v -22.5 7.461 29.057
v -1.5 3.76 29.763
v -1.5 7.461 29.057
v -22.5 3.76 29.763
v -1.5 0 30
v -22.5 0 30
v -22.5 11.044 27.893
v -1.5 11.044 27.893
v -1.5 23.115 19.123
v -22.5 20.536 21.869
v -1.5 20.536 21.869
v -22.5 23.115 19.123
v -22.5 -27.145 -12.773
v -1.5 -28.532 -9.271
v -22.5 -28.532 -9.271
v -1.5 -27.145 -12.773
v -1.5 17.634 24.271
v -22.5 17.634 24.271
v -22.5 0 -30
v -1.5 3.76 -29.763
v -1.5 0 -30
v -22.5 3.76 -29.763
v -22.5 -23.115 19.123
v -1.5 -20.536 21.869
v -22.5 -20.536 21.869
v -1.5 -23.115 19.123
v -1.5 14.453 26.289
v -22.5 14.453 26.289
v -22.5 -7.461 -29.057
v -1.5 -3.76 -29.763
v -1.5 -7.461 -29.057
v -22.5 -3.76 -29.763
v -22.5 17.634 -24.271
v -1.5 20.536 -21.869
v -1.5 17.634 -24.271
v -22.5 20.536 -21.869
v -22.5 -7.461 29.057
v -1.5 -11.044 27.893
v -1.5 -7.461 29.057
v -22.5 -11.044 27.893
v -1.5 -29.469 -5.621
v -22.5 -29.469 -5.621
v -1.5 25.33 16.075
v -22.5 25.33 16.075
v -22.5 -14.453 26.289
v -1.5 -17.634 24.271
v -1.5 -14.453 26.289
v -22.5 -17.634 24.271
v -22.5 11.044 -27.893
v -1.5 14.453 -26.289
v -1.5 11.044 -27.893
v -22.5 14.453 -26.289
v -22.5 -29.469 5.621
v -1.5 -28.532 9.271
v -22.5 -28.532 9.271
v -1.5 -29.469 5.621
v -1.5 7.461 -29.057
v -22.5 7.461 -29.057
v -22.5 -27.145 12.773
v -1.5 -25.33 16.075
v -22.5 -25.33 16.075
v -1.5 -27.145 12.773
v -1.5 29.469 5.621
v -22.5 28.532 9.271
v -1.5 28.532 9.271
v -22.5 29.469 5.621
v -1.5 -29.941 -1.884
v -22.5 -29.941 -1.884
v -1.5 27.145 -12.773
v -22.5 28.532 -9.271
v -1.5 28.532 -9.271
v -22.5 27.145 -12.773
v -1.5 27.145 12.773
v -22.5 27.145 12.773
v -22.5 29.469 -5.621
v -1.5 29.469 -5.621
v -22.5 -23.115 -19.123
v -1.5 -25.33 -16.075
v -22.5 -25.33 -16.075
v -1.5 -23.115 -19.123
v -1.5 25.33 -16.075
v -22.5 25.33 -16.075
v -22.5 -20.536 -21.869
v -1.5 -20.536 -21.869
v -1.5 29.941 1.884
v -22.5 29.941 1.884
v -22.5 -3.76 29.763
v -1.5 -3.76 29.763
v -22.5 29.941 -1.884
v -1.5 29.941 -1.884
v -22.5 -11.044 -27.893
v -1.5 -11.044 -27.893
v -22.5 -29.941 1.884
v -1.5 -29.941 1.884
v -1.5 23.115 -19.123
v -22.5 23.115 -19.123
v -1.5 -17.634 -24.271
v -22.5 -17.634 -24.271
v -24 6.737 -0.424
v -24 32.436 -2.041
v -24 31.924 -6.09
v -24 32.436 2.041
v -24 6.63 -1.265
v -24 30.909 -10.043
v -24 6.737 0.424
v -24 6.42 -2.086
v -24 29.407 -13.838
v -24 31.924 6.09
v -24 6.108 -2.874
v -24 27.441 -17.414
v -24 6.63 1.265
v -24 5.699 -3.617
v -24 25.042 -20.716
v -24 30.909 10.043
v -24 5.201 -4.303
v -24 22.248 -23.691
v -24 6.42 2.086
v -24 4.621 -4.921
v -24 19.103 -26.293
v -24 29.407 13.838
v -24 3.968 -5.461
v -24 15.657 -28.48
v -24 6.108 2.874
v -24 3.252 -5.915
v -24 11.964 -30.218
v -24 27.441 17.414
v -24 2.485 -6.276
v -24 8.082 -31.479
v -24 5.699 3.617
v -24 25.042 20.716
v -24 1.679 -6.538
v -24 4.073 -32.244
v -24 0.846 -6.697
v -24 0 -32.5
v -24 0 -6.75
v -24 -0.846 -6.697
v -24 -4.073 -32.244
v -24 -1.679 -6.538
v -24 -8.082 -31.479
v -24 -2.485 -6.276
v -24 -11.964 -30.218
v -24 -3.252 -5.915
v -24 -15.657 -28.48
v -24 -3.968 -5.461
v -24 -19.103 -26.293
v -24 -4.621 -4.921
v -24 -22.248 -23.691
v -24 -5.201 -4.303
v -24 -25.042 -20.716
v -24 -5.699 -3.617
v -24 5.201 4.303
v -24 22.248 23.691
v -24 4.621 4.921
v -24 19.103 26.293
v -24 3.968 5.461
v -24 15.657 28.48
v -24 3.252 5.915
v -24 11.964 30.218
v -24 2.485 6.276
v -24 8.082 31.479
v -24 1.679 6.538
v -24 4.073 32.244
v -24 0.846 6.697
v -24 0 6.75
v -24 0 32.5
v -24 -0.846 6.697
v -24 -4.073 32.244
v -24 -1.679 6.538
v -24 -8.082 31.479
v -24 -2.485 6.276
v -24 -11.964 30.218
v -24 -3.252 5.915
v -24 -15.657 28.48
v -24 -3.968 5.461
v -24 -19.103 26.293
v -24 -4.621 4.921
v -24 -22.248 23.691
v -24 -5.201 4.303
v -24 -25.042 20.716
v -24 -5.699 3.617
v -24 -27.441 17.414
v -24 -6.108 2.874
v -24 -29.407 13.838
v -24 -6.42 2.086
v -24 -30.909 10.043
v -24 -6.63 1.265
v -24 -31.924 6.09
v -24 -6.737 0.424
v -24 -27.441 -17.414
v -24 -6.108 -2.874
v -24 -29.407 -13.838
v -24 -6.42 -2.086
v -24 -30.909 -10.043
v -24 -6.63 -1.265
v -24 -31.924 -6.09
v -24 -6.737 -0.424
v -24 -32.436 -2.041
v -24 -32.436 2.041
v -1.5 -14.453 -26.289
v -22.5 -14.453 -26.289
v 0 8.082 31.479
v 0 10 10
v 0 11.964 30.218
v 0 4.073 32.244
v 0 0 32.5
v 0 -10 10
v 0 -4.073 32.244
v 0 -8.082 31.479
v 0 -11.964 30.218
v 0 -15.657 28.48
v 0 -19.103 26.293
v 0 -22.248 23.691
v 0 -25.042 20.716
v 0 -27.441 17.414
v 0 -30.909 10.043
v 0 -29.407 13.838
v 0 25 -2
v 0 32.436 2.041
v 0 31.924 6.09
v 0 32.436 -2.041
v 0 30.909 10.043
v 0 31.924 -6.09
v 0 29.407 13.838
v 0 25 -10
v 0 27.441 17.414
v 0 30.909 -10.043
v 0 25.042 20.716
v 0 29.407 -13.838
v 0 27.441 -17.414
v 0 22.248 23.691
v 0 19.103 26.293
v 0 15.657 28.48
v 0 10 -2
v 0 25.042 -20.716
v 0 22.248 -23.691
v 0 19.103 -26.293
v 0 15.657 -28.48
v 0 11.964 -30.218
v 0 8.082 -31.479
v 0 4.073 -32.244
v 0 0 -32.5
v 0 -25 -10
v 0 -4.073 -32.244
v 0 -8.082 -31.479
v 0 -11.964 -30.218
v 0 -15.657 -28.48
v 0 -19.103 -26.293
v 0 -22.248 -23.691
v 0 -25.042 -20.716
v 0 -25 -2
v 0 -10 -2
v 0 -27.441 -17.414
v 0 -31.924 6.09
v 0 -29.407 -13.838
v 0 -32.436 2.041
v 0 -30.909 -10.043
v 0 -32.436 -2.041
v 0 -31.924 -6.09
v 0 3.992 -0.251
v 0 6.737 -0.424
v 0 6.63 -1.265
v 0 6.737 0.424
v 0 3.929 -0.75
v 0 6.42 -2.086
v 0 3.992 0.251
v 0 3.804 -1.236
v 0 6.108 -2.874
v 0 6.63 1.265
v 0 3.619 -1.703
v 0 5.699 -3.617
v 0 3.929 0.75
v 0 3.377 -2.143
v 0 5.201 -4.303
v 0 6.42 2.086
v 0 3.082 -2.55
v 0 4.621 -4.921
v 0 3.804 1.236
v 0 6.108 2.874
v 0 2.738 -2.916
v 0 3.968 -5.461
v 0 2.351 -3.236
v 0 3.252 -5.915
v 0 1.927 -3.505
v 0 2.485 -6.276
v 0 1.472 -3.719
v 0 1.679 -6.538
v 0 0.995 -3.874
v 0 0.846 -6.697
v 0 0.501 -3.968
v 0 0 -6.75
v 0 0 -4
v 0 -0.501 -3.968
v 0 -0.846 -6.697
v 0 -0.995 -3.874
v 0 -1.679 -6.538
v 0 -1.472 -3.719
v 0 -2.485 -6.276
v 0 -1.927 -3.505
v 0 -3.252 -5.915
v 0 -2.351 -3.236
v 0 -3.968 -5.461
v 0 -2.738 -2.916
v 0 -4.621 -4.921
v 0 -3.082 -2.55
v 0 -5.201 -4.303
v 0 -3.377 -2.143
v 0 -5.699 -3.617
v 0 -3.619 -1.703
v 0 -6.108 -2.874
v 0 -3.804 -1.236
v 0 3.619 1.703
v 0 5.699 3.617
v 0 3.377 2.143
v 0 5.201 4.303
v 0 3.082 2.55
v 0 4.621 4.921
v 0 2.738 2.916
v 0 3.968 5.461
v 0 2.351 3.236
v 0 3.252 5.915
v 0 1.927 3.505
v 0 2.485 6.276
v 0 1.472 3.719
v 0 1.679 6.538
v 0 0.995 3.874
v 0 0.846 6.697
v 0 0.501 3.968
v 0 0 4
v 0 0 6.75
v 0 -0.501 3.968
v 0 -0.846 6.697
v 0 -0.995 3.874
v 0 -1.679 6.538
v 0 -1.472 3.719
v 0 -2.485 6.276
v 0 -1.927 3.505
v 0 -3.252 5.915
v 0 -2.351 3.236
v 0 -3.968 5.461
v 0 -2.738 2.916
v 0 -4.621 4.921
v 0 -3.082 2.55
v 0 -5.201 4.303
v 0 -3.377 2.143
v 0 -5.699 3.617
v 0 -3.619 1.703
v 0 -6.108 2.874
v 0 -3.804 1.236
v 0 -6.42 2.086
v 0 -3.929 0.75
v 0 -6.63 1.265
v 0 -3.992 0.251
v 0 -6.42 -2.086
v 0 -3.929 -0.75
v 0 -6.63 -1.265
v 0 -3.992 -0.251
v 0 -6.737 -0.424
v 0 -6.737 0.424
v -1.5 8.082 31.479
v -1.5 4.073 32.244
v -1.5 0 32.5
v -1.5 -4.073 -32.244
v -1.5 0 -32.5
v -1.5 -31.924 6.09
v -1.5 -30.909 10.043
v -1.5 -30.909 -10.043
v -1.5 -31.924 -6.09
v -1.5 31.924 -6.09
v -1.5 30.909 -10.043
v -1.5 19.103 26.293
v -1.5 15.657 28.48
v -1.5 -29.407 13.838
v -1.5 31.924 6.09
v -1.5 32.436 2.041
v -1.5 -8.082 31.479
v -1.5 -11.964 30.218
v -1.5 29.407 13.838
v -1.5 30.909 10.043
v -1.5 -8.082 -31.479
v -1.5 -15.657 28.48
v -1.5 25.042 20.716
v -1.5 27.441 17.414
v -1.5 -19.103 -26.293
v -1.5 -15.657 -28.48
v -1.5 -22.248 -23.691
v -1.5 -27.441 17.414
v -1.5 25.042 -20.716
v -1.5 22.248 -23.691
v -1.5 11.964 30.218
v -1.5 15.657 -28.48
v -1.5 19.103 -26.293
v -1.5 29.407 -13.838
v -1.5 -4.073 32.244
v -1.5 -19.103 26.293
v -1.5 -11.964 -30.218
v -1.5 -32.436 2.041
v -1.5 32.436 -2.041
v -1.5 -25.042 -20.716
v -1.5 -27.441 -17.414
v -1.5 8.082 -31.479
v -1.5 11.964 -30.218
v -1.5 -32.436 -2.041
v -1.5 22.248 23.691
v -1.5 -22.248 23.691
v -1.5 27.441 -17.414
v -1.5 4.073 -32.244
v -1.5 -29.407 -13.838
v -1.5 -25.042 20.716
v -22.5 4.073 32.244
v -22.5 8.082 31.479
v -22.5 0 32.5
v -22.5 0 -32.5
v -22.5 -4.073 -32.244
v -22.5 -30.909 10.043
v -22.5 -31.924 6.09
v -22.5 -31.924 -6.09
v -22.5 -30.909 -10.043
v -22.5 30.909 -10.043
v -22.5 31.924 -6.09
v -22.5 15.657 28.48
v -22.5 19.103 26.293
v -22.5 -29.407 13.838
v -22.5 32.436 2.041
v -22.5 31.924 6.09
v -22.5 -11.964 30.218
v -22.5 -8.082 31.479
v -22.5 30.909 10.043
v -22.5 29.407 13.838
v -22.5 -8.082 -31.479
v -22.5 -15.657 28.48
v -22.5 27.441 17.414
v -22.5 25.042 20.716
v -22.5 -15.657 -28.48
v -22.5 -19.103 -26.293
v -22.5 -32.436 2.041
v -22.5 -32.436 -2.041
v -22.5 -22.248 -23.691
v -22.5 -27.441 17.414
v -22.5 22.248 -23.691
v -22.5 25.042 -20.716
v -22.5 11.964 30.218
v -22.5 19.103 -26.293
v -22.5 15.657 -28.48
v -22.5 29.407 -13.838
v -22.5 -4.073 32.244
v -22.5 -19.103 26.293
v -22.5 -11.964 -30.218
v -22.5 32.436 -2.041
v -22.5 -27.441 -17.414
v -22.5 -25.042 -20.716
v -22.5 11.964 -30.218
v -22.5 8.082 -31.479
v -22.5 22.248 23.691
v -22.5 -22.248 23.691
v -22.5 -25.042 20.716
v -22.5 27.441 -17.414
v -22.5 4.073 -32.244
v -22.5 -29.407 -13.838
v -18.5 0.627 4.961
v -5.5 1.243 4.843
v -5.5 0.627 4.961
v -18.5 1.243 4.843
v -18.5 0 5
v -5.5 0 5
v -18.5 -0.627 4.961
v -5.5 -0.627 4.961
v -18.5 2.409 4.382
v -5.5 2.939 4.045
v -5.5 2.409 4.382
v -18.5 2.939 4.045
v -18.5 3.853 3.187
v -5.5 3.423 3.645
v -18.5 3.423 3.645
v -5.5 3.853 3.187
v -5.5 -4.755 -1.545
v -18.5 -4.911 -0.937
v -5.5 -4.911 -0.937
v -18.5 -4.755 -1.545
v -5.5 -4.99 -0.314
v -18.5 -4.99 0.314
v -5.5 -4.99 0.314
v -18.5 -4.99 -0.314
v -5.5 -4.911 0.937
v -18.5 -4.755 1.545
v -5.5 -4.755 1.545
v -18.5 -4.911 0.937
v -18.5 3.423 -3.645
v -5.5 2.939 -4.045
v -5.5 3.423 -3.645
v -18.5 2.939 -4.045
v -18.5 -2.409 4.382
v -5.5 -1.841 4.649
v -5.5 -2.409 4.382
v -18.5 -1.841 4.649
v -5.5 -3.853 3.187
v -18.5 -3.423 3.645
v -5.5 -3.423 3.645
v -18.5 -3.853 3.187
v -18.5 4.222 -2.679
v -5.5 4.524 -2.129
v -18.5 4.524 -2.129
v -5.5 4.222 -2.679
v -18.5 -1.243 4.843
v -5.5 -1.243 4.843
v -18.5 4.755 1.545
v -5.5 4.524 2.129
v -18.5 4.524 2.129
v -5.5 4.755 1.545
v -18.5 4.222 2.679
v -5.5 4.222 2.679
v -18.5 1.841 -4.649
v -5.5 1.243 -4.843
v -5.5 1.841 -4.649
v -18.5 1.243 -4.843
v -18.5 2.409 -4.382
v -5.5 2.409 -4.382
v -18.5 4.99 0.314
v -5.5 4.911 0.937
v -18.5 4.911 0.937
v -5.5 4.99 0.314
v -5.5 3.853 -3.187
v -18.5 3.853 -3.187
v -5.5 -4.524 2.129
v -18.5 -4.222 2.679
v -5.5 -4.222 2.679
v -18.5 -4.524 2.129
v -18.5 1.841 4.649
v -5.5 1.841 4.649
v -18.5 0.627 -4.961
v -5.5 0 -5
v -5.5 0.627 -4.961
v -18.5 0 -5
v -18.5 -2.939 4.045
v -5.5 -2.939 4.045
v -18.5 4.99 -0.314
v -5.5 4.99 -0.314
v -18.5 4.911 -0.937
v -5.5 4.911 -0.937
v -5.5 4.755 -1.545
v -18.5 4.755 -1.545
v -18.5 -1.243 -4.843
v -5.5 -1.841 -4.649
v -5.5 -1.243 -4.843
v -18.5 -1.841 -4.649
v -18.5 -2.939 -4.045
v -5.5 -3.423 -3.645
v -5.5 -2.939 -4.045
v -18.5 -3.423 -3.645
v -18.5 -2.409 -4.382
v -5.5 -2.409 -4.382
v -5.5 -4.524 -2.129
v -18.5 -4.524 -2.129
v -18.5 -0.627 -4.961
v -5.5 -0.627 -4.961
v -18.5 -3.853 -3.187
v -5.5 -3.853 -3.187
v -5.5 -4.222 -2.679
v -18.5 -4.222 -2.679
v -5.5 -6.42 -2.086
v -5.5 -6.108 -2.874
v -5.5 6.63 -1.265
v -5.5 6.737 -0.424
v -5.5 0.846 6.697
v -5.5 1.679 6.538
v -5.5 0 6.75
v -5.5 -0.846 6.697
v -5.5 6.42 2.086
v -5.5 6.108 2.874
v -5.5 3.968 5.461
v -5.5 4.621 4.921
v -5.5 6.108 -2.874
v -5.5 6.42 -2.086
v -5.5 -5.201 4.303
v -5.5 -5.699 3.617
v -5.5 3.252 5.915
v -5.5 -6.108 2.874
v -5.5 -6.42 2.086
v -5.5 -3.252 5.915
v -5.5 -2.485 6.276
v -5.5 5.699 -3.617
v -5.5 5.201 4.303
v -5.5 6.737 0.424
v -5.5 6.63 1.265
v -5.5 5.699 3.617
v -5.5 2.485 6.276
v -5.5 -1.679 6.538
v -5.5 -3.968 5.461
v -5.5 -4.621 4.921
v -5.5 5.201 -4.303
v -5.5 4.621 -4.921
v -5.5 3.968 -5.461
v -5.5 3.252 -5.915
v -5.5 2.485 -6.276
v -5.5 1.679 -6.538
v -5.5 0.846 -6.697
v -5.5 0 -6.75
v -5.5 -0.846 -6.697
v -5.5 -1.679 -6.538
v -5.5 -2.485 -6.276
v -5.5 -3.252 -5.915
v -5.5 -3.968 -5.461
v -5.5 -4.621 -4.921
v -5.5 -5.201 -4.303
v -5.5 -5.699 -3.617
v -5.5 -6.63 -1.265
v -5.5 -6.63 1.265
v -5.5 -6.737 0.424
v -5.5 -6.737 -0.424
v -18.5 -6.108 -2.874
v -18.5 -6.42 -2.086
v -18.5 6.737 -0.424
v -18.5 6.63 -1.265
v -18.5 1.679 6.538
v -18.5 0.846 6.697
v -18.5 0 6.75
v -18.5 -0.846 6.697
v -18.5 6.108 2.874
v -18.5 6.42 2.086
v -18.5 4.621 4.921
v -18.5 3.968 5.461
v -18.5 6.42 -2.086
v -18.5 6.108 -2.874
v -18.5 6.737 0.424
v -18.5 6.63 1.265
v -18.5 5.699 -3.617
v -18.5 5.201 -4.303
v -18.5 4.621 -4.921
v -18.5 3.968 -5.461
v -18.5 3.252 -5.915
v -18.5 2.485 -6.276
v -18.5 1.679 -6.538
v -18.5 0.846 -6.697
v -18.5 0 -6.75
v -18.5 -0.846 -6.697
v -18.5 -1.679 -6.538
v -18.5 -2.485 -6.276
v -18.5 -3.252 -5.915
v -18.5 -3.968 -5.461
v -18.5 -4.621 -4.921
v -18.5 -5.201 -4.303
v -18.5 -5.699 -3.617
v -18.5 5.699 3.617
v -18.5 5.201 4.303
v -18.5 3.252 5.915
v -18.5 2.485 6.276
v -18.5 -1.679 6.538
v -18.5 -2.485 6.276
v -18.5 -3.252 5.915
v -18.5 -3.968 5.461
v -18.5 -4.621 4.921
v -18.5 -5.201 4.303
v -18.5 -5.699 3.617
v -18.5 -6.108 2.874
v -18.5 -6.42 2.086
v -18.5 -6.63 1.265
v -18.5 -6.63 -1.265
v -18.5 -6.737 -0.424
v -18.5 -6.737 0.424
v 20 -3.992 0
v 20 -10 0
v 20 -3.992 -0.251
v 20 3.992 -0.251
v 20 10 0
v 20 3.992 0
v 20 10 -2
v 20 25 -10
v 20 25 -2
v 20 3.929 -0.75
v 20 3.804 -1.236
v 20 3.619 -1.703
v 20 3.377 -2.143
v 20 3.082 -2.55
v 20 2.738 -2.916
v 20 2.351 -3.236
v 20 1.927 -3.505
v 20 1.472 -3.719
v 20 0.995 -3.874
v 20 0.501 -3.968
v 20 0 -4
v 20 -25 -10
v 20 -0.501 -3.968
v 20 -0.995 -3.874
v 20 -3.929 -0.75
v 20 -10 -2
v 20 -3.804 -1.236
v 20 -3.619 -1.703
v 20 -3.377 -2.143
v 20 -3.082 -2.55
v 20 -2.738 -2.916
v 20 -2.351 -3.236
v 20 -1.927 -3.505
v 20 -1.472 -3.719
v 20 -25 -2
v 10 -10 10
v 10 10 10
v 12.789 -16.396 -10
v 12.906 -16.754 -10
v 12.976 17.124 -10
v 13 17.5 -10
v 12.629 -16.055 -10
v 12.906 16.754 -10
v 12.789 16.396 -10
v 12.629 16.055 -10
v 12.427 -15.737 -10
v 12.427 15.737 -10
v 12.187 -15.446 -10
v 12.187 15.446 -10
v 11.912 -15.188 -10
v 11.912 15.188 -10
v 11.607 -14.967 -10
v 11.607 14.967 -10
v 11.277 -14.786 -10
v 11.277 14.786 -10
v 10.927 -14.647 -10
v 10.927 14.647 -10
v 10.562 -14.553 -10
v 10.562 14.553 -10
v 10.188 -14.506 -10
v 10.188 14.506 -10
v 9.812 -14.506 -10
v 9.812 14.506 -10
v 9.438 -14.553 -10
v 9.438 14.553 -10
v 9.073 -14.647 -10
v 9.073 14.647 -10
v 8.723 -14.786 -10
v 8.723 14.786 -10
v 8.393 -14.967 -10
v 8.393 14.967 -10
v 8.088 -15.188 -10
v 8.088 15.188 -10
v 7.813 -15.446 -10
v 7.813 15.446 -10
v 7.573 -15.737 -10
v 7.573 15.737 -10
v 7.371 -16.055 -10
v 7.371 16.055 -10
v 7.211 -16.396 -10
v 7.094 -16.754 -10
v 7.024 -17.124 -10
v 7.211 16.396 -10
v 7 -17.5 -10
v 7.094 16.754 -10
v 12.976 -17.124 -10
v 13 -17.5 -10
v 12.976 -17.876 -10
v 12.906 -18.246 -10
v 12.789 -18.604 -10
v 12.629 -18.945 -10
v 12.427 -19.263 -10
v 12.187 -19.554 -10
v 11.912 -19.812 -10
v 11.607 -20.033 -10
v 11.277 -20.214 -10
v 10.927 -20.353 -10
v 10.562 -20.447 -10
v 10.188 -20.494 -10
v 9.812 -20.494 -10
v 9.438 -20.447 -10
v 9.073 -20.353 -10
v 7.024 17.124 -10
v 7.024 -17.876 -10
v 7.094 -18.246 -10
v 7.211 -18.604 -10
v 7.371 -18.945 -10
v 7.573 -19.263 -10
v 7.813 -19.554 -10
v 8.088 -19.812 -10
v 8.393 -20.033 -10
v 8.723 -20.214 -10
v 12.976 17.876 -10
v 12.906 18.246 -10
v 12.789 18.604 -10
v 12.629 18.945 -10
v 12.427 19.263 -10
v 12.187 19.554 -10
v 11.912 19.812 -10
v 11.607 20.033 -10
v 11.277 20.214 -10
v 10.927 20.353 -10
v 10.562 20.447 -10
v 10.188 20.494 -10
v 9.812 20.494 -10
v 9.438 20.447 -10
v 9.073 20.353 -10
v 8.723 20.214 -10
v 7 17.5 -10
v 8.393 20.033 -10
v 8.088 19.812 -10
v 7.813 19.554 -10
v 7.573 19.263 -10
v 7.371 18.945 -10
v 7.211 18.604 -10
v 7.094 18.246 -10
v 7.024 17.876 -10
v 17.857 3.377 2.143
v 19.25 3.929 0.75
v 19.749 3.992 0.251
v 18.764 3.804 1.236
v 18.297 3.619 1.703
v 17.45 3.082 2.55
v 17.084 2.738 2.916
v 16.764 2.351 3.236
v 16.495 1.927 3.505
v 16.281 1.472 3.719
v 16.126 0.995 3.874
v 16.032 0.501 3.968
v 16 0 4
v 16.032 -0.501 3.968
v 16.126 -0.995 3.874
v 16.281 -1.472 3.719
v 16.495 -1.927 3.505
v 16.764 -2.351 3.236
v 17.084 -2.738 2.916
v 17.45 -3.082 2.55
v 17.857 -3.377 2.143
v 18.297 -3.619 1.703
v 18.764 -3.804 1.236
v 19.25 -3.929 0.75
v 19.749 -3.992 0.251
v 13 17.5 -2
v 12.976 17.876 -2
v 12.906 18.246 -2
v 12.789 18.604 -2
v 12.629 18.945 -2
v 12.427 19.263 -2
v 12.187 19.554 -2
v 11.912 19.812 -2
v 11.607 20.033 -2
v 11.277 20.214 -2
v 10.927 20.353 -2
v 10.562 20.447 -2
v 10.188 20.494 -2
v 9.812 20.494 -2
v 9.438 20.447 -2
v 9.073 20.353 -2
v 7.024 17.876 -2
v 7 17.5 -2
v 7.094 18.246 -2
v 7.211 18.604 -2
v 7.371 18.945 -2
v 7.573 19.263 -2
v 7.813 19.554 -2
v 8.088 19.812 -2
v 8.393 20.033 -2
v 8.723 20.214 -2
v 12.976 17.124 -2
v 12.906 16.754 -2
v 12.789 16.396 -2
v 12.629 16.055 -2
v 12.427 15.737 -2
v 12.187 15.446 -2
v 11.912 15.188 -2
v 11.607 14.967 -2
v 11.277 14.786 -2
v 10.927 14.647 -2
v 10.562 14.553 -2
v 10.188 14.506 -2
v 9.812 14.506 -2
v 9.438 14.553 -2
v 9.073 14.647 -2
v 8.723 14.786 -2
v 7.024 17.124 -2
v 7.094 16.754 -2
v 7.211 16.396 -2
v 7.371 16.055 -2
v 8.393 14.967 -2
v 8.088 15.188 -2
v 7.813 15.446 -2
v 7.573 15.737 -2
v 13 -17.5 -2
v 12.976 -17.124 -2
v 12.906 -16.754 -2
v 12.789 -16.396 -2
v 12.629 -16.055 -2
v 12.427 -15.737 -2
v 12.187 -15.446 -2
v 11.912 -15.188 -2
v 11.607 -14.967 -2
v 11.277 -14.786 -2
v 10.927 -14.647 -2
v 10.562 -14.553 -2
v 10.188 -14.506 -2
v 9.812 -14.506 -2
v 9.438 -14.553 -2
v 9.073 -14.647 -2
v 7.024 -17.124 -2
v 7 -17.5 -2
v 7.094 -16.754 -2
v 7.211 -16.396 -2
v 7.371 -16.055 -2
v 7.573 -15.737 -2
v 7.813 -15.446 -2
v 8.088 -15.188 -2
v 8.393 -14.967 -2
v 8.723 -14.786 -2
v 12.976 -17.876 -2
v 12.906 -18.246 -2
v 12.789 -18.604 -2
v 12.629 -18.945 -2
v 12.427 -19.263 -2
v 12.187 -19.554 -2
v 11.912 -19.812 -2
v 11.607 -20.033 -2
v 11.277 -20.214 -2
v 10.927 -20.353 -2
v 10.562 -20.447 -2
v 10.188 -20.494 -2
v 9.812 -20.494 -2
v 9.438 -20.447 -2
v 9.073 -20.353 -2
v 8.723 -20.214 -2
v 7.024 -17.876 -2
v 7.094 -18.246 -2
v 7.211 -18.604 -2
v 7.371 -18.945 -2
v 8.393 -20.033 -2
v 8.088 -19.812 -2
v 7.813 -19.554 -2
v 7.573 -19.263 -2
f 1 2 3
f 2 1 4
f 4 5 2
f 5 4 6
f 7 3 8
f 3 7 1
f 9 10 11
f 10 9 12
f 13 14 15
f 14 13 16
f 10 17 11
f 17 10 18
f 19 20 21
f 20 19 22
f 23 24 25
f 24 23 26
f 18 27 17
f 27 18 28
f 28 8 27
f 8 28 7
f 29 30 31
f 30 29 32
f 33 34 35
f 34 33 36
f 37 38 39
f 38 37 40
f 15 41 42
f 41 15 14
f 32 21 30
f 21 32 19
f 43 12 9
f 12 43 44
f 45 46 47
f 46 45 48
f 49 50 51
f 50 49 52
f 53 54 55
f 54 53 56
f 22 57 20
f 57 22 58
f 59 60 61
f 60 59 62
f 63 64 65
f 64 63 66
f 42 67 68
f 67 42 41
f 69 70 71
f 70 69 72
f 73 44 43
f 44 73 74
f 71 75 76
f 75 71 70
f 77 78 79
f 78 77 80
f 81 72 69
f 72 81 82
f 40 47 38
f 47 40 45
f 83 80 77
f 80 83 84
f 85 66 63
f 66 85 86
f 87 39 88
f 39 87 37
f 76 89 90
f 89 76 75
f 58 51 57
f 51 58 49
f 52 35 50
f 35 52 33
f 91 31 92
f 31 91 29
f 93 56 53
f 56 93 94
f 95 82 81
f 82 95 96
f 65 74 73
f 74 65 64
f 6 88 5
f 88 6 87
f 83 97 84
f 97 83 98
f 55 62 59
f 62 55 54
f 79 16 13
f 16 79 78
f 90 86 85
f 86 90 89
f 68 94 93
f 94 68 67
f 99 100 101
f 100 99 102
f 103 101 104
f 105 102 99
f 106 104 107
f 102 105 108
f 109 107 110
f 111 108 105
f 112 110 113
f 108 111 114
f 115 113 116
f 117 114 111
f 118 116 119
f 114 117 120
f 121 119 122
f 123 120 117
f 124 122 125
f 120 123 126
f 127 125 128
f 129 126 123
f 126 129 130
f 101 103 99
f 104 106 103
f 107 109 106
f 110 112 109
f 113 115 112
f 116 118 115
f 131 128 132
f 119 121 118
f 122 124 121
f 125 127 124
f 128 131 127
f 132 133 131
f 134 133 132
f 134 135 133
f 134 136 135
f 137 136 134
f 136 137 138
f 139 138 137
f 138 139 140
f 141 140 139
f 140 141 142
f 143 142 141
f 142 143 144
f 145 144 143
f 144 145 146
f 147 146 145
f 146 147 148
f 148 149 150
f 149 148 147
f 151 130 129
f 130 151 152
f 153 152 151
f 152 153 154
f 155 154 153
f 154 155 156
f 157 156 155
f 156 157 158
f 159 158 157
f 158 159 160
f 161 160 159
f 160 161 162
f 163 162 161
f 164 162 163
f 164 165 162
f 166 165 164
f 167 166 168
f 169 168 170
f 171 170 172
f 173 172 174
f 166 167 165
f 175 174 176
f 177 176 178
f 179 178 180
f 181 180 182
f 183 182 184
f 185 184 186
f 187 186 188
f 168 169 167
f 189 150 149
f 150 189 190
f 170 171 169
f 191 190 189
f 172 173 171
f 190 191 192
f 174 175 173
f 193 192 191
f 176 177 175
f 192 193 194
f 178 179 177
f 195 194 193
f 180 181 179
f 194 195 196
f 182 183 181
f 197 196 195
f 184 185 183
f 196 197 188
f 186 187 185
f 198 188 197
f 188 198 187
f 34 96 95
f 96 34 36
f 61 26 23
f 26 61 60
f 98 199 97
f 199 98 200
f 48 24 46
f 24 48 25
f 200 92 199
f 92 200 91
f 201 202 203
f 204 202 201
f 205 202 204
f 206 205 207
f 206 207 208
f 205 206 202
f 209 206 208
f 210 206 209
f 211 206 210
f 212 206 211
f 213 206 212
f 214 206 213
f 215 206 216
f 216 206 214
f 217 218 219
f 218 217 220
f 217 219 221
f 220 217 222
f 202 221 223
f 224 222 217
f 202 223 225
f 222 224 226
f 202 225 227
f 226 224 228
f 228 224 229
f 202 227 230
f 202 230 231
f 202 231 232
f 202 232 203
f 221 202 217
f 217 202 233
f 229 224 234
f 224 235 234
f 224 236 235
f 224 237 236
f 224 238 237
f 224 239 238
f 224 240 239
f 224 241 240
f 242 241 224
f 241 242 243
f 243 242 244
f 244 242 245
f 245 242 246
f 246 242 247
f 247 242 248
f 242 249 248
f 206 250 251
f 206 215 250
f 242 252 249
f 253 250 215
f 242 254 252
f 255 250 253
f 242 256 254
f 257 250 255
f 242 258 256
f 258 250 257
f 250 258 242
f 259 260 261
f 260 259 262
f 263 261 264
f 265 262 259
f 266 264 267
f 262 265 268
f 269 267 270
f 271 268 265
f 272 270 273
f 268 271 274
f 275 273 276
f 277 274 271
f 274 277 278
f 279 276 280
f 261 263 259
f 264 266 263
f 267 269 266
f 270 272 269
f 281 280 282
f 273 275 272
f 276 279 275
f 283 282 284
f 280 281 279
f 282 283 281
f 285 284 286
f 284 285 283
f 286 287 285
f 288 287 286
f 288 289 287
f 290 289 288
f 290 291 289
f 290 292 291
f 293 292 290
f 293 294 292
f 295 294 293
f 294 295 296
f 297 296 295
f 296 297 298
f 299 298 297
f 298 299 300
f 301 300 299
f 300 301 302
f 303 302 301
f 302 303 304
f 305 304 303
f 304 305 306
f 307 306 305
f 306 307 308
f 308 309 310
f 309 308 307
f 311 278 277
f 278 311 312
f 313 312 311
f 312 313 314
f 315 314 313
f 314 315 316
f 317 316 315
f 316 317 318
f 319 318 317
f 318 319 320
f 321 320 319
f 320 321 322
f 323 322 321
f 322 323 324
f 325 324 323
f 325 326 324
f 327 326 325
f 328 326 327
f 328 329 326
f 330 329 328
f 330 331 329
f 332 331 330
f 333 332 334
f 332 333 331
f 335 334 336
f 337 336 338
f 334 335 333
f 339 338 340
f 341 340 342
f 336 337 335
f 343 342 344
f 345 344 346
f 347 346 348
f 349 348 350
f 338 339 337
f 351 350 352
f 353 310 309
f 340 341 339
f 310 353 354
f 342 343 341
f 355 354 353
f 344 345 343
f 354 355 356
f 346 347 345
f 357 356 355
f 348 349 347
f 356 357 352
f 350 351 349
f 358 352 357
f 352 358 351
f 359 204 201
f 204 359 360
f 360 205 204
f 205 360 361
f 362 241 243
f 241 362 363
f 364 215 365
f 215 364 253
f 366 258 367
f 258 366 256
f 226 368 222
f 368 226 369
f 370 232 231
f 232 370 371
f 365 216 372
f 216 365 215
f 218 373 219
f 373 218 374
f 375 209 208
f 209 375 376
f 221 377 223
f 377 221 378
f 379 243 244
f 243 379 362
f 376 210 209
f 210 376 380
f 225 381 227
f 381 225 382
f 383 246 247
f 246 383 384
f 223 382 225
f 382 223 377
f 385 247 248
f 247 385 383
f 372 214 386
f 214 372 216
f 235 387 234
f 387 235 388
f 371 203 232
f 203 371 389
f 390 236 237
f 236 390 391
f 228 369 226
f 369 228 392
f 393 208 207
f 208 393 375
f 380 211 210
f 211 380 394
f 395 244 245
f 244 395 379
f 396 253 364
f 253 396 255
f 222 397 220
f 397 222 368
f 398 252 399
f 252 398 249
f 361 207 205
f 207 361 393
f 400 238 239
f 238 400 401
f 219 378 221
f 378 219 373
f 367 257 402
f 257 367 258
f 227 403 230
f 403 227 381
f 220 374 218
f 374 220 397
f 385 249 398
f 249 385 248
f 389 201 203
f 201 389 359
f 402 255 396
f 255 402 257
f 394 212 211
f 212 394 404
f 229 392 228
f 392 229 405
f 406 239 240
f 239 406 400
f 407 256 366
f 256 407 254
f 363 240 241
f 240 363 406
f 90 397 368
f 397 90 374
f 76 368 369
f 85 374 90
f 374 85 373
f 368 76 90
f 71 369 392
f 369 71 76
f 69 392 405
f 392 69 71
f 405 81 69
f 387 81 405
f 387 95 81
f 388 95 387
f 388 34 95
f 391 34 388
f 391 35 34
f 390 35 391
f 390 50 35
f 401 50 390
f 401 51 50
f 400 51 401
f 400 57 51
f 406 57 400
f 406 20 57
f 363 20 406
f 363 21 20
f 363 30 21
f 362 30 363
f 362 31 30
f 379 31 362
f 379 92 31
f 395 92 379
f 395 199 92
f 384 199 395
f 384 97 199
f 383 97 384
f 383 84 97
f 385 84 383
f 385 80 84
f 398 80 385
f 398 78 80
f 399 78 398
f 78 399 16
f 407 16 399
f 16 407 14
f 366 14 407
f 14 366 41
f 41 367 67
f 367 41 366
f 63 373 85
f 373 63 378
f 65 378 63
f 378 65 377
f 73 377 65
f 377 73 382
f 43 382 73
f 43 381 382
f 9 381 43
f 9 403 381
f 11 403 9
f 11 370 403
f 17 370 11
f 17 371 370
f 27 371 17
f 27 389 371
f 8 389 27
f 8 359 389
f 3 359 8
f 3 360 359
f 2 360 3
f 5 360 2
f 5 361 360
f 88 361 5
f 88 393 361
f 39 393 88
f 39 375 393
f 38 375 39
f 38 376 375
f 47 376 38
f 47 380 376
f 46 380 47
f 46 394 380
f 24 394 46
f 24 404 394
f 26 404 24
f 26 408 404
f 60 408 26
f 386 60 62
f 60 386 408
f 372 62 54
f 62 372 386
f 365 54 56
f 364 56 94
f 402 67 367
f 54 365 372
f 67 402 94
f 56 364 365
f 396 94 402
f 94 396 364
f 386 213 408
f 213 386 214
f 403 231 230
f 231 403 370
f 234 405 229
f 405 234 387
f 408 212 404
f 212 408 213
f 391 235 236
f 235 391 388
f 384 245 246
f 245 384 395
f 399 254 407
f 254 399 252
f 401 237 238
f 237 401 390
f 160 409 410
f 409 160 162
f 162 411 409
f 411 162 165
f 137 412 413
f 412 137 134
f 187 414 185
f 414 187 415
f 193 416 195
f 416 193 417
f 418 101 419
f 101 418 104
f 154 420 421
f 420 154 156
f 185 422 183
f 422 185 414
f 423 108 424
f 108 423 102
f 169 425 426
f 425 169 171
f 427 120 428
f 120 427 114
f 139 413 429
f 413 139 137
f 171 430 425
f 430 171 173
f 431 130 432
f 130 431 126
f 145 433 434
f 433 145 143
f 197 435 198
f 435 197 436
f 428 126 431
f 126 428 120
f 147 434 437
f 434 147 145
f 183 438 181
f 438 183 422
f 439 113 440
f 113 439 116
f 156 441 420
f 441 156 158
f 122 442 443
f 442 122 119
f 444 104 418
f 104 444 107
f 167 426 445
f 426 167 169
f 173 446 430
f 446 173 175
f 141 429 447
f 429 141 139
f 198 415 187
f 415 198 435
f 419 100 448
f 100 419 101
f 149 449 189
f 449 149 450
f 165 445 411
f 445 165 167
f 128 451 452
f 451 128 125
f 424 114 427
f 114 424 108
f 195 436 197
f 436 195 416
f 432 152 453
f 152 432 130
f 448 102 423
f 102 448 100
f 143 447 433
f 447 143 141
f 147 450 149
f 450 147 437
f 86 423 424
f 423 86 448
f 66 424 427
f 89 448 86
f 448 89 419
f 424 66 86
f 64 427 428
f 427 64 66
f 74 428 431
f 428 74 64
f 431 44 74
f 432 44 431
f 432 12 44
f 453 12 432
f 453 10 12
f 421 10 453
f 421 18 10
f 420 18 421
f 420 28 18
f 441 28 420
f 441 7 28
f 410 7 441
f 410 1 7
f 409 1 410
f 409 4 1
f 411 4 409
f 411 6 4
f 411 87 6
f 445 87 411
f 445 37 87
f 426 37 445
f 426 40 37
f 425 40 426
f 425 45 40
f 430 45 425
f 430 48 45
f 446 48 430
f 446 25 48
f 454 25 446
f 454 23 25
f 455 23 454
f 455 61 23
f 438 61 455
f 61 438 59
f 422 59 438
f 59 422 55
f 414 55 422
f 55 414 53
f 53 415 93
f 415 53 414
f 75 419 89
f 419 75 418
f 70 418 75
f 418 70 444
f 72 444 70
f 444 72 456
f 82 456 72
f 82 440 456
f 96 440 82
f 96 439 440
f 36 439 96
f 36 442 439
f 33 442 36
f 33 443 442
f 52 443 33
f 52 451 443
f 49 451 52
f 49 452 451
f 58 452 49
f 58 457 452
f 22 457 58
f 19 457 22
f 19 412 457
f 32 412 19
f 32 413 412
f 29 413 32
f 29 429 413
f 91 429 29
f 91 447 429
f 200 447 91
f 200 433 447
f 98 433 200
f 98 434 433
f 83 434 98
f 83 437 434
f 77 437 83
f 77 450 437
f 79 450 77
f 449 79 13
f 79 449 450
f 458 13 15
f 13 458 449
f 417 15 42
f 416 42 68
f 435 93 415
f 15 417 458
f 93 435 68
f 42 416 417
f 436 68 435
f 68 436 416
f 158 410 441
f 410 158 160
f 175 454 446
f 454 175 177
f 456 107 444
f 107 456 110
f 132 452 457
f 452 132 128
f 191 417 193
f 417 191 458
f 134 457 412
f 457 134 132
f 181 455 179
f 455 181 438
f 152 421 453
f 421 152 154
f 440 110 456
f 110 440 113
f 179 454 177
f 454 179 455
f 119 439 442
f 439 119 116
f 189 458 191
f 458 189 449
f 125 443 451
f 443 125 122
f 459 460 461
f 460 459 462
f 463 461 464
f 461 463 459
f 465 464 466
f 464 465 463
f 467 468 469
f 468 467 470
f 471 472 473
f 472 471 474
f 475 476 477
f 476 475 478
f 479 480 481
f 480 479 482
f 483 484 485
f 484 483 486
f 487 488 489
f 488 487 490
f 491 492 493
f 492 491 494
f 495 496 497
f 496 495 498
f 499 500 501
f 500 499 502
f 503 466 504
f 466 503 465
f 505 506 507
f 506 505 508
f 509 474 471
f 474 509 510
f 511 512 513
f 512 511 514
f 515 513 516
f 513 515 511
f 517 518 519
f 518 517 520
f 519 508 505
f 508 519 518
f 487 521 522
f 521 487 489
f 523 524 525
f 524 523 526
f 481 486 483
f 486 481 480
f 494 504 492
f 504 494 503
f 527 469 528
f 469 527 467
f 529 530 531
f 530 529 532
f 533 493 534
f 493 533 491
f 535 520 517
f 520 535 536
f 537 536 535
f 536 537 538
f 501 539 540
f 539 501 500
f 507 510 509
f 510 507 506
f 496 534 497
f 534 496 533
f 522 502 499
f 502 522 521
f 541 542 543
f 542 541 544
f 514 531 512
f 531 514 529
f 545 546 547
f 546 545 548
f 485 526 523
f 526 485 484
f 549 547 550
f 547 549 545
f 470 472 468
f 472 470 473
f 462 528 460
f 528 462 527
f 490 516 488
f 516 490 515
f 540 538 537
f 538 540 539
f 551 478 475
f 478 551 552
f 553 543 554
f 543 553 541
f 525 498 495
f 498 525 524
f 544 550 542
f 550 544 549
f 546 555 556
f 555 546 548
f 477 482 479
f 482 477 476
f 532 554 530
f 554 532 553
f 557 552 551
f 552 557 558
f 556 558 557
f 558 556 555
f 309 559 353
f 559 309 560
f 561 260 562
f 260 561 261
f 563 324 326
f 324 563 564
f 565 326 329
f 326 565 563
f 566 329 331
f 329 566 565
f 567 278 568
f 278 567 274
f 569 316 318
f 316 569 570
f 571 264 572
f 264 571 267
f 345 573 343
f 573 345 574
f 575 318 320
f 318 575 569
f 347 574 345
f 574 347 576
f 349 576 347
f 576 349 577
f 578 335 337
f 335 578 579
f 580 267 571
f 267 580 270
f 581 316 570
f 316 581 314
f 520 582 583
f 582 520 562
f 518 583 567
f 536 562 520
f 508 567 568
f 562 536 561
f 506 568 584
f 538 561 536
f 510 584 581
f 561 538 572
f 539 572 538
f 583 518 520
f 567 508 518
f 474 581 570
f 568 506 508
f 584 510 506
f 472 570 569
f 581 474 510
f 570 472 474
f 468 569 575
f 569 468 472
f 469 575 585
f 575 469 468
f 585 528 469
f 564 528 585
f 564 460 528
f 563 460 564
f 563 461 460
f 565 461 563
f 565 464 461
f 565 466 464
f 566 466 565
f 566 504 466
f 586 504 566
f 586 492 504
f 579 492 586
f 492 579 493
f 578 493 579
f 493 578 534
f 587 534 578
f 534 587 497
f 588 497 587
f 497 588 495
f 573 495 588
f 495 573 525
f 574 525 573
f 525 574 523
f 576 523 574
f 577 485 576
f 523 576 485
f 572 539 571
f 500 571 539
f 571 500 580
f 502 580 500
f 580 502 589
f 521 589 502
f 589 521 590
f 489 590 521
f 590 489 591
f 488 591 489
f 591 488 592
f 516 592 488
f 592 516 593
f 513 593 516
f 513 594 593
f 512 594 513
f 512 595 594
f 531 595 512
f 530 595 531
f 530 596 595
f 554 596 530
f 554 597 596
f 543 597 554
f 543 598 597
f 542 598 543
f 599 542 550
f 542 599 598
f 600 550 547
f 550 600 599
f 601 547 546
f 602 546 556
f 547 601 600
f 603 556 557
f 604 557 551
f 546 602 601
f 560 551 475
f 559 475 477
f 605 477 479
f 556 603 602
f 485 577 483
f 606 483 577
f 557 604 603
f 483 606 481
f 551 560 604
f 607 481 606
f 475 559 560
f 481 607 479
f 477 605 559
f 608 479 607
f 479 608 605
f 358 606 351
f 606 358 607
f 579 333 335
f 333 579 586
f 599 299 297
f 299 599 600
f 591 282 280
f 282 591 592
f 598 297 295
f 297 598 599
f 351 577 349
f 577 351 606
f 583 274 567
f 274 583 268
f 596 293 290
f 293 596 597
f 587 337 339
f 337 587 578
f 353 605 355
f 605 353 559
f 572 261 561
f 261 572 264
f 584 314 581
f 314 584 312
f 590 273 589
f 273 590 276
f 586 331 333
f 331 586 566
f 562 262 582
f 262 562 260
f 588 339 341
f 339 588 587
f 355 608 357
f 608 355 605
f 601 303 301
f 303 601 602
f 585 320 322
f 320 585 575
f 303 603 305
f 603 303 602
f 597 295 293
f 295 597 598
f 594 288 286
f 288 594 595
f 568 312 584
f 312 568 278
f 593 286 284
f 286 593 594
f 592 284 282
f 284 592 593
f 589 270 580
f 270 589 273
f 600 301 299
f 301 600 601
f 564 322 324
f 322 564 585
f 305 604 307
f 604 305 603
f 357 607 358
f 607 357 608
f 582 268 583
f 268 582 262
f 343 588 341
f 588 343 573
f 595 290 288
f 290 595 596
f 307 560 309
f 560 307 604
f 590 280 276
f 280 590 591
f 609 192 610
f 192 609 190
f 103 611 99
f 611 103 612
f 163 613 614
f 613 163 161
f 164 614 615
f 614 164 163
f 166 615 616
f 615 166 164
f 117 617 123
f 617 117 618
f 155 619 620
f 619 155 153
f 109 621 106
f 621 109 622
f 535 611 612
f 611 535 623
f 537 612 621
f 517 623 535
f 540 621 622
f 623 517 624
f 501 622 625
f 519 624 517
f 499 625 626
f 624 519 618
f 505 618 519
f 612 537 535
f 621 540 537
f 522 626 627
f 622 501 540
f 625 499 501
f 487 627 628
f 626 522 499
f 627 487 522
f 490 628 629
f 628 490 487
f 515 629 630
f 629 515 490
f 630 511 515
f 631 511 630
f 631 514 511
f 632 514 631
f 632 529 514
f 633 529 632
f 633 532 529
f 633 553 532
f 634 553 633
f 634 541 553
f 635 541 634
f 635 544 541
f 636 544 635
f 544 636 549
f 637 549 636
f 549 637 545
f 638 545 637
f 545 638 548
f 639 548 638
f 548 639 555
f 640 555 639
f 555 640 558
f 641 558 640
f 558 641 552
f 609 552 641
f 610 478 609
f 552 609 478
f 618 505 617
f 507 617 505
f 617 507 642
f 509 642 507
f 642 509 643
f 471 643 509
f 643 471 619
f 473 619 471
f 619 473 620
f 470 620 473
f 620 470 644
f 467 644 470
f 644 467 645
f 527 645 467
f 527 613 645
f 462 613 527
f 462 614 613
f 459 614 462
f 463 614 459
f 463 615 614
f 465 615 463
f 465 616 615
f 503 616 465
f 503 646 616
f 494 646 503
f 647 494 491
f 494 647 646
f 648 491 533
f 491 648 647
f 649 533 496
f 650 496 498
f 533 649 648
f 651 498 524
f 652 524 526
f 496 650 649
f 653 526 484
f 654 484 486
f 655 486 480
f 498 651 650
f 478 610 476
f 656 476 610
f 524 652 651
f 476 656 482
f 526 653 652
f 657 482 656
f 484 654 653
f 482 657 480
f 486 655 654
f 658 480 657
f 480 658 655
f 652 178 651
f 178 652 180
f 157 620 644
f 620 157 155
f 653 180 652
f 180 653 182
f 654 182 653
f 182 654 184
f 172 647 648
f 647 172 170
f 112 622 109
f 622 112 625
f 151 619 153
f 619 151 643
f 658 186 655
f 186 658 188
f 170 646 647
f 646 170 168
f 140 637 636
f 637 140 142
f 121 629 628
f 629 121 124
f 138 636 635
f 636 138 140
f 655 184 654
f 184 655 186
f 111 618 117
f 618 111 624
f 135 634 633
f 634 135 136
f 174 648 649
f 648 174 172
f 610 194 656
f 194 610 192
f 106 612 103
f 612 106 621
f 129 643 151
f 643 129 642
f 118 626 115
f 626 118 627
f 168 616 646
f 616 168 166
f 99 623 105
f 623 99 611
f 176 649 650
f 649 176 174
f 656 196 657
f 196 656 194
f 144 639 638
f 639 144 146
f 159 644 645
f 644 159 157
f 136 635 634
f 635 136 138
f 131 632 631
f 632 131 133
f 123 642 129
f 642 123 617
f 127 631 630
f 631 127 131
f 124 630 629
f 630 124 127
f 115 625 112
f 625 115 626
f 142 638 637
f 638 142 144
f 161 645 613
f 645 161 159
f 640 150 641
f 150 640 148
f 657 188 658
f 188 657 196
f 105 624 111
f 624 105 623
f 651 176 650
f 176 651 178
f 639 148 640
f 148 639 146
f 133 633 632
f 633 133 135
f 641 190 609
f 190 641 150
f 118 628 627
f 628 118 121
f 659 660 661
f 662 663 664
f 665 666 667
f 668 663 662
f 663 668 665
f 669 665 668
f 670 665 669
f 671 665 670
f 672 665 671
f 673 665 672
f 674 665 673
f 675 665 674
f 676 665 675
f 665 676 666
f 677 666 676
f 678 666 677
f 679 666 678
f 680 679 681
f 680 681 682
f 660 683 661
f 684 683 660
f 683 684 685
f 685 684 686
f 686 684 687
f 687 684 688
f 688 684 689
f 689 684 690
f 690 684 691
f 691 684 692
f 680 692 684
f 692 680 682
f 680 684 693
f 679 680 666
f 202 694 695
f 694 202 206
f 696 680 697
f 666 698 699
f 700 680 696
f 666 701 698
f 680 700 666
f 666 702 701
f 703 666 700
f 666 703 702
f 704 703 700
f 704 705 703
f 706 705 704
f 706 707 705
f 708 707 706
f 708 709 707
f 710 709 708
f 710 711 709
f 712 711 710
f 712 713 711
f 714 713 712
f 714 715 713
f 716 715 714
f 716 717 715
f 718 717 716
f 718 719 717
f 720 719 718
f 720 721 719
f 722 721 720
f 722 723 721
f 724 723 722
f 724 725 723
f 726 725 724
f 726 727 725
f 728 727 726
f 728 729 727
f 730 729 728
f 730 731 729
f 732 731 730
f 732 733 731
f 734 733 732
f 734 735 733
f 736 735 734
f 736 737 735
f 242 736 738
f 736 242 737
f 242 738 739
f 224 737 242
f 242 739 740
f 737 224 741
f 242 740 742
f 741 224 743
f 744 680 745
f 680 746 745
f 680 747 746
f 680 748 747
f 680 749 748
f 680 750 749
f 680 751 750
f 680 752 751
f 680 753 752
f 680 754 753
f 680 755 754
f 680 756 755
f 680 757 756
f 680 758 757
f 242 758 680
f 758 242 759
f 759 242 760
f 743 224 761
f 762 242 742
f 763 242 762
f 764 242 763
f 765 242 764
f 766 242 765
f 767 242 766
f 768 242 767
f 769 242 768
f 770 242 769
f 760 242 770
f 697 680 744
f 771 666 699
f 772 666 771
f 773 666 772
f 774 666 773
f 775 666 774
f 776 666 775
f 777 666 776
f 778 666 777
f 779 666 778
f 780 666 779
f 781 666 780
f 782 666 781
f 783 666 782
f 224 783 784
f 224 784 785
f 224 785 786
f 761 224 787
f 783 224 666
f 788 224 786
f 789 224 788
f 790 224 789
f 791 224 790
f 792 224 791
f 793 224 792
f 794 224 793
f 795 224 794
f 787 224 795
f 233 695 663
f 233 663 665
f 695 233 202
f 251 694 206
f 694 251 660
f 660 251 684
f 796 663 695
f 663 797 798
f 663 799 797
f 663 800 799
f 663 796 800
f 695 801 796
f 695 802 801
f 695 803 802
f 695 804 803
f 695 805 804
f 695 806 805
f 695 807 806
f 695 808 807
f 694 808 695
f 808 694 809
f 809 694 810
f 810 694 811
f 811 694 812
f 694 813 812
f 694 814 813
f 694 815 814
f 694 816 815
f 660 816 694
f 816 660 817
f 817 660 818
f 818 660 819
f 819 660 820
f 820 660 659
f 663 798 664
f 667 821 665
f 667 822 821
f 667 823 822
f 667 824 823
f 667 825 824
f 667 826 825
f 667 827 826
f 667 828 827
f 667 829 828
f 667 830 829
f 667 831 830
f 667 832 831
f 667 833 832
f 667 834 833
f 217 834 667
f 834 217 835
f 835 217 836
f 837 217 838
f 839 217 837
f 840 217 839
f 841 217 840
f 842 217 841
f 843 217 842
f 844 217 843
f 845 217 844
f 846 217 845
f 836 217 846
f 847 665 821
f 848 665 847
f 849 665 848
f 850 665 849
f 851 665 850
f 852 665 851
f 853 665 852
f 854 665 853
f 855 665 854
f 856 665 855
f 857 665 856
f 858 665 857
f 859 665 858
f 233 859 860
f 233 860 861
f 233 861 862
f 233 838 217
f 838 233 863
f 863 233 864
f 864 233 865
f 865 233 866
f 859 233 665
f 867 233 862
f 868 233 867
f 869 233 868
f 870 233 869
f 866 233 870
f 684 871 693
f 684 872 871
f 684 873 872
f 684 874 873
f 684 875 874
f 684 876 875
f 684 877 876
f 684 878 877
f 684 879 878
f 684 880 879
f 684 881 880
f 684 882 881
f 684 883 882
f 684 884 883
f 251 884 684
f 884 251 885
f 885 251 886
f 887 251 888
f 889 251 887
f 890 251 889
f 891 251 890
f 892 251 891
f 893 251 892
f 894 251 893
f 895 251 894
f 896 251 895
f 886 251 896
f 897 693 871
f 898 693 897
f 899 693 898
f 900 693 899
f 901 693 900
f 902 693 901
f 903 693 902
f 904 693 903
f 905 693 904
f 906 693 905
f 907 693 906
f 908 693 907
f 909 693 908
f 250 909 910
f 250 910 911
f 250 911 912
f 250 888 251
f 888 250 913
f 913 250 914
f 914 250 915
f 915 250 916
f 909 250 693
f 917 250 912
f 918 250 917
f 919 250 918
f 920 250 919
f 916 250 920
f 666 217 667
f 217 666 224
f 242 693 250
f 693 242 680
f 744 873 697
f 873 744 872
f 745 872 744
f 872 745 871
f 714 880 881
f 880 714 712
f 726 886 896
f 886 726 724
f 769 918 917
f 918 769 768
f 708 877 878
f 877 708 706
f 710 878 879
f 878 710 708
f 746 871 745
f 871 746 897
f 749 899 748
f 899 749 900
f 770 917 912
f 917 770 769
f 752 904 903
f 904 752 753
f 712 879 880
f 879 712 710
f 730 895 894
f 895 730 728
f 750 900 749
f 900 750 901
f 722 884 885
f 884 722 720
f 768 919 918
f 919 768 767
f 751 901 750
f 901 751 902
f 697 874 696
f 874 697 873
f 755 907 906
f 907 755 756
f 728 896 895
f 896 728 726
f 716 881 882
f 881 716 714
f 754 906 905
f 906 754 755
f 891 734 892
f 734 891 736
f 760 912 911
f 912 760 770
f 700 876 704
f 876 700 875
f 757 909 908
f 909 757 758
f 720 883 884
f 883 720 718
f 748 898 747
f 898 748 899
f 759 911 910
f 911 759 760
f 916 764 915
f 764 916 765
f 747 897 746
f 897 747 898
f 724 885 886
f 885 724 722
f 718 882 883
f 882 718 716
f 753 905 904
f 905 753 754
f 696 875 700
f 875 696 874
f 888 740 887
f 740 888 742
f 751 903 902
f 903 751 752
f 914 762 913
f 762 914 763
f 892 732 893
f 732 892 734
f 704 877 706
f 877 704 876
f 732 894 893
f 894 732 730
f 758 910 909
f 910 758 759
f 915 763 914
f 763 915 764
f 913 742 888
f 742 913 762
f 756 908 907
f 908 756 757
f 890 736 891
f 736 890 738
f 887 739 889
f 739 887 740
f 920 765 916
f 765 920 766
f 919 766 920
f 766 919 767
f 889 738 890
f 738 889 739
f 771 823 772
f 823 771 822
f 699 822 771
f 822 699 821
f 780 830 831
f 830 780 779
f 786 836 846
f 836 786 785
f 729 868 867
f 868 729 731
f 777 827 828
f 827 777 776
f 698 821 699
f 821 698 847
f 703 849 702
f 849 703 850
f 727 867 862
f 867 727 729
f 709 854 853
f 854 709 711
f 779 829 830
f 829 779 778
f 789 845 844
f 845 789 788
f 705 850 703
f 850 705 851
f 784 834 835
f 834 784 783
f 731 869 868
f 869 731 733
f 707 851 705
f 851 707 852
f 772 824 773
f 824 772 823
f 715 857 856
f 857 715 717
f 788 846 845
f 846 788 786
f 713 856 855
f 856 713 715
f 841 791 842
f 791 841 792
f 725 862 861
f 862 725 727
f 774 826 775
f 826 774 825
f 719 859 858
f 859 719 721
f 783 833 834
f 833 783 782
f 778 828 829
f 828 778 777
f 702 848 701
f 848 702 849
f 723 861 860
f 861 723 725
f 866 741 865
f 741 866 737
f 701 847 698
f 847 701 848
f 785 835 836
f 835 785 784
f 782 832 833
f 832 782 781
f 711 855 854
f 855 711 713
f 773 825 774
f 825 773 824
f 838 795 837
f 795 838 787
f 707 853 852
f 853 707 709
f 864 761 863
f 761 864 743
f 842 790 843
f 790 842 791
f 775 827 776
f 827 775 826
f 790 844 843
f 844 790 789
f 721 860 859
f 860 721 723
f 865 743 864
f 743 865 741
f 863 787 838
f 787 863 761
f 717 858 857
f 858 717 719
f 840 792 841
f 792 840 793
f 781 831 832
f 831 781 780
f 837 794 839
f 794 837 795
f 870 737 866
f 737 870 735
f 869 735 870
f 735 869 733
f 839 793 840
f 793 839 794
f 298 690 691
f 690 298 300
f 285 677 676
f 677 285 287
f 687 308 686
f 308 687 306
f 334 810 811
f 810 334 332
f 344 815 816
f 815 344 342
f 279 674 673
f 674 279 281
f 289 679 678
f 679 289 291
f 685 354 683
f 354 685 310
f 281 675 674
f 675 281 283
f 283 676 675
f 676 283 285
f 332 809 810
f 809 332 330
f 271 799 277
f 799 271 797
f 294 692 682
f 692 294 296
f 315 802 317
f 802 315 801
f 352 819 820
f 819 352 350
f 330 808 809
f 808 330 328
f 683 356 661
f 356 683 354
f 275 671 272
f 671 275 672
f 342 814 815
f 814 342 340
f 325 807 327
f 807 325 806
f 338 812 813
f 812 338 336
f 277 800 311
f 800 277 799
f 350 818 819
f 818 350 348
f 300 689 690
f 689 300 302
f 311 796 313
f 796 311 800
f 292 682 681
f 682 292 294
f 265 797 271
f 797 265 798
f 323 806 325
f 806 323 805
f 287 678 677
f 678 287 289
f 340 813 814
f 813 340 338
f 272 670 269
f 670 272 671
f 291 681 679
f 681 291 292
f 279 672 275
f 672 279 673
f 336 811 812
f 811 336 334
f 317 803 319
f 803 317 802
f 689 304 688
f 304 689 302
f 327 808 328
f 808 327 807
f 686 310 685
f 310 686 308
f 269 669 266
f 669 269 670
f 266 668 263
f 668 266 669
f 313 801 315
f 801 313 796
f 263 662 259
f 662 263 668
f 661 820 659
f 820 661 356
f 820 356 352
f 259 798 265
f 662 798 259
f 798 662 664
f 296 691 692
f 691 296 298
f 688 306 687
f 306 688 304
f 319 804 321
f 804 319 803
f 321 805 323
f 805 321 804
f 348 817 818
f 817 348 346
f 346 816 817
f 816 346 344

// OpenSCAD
$fn=50;

plate_size=[300,350];

wheel_diameter=[60,65];
wheel_height=[24,1.5];

wheel_hole_diameter=[10,13.5];
wheel_hole_depth=5.5;

wheel_pos=[[0,plate_size[0]],[60, plate_size[1]-60],10];


// OUTPUT

/*
plate();

for (i = [0:1])
{
		
	for (j = [0:1])
	{
		translate([wheel_pos[0][j],wheel_pos[1][i],wheel_pos[2]])
			rotate(90*(2*j-1),[0,1,0])
				wheel();
		
	}
}
*/

rotate(-90,[0,1,0])
	wheel();

wheel_mount();


// MODULES

module wheel()
{
	difference()
	{
		union()
		{
			cylinder(wheel_height[0], d=wheel_diameter[0]);
			cylinder(wheel_height[1], d=wheel_diameter[1]);
			translate([0,0,wheel_height[0]-wheel_height[1]])
				cylinder(wheel_height[1],d=wheel_diameter[1]);
		}
		union()
		{
			cylinder(wheel_height[0], d=wheel_hole_diameter[0]);

			cylinder(wheel_hole_depth, d=wheel_hole_diameter[1]);
			translate([0,0,wheel_height[0]-wheel_hole_depth])
				cylinder(wheel_hole_depth, d=wheel_hole_diameter[1]);
		}
	}
}

module plate()
{
	cube(concat(plate_size, 3));
}

module wheel_mount()
{
	difference()
	{
		union()
		{
			translate([0,-25,-10])
			cube([20,50,8]);
			
			translate([0,-10,-10])
			difference()
			{
				cube(20);
				translate([10,0,20])
					rotate(45,[0,1,0])
						cube(20);
			}
		}
		union()
		{
			rotate(90,[0,1,0])
				cylinder(50, r=4);
			
			for (i = [-1:2:1])
			{
				translate([10,i*17.5,-10])
				cylinder(10, r=3);
			}
		}		
	}
}
